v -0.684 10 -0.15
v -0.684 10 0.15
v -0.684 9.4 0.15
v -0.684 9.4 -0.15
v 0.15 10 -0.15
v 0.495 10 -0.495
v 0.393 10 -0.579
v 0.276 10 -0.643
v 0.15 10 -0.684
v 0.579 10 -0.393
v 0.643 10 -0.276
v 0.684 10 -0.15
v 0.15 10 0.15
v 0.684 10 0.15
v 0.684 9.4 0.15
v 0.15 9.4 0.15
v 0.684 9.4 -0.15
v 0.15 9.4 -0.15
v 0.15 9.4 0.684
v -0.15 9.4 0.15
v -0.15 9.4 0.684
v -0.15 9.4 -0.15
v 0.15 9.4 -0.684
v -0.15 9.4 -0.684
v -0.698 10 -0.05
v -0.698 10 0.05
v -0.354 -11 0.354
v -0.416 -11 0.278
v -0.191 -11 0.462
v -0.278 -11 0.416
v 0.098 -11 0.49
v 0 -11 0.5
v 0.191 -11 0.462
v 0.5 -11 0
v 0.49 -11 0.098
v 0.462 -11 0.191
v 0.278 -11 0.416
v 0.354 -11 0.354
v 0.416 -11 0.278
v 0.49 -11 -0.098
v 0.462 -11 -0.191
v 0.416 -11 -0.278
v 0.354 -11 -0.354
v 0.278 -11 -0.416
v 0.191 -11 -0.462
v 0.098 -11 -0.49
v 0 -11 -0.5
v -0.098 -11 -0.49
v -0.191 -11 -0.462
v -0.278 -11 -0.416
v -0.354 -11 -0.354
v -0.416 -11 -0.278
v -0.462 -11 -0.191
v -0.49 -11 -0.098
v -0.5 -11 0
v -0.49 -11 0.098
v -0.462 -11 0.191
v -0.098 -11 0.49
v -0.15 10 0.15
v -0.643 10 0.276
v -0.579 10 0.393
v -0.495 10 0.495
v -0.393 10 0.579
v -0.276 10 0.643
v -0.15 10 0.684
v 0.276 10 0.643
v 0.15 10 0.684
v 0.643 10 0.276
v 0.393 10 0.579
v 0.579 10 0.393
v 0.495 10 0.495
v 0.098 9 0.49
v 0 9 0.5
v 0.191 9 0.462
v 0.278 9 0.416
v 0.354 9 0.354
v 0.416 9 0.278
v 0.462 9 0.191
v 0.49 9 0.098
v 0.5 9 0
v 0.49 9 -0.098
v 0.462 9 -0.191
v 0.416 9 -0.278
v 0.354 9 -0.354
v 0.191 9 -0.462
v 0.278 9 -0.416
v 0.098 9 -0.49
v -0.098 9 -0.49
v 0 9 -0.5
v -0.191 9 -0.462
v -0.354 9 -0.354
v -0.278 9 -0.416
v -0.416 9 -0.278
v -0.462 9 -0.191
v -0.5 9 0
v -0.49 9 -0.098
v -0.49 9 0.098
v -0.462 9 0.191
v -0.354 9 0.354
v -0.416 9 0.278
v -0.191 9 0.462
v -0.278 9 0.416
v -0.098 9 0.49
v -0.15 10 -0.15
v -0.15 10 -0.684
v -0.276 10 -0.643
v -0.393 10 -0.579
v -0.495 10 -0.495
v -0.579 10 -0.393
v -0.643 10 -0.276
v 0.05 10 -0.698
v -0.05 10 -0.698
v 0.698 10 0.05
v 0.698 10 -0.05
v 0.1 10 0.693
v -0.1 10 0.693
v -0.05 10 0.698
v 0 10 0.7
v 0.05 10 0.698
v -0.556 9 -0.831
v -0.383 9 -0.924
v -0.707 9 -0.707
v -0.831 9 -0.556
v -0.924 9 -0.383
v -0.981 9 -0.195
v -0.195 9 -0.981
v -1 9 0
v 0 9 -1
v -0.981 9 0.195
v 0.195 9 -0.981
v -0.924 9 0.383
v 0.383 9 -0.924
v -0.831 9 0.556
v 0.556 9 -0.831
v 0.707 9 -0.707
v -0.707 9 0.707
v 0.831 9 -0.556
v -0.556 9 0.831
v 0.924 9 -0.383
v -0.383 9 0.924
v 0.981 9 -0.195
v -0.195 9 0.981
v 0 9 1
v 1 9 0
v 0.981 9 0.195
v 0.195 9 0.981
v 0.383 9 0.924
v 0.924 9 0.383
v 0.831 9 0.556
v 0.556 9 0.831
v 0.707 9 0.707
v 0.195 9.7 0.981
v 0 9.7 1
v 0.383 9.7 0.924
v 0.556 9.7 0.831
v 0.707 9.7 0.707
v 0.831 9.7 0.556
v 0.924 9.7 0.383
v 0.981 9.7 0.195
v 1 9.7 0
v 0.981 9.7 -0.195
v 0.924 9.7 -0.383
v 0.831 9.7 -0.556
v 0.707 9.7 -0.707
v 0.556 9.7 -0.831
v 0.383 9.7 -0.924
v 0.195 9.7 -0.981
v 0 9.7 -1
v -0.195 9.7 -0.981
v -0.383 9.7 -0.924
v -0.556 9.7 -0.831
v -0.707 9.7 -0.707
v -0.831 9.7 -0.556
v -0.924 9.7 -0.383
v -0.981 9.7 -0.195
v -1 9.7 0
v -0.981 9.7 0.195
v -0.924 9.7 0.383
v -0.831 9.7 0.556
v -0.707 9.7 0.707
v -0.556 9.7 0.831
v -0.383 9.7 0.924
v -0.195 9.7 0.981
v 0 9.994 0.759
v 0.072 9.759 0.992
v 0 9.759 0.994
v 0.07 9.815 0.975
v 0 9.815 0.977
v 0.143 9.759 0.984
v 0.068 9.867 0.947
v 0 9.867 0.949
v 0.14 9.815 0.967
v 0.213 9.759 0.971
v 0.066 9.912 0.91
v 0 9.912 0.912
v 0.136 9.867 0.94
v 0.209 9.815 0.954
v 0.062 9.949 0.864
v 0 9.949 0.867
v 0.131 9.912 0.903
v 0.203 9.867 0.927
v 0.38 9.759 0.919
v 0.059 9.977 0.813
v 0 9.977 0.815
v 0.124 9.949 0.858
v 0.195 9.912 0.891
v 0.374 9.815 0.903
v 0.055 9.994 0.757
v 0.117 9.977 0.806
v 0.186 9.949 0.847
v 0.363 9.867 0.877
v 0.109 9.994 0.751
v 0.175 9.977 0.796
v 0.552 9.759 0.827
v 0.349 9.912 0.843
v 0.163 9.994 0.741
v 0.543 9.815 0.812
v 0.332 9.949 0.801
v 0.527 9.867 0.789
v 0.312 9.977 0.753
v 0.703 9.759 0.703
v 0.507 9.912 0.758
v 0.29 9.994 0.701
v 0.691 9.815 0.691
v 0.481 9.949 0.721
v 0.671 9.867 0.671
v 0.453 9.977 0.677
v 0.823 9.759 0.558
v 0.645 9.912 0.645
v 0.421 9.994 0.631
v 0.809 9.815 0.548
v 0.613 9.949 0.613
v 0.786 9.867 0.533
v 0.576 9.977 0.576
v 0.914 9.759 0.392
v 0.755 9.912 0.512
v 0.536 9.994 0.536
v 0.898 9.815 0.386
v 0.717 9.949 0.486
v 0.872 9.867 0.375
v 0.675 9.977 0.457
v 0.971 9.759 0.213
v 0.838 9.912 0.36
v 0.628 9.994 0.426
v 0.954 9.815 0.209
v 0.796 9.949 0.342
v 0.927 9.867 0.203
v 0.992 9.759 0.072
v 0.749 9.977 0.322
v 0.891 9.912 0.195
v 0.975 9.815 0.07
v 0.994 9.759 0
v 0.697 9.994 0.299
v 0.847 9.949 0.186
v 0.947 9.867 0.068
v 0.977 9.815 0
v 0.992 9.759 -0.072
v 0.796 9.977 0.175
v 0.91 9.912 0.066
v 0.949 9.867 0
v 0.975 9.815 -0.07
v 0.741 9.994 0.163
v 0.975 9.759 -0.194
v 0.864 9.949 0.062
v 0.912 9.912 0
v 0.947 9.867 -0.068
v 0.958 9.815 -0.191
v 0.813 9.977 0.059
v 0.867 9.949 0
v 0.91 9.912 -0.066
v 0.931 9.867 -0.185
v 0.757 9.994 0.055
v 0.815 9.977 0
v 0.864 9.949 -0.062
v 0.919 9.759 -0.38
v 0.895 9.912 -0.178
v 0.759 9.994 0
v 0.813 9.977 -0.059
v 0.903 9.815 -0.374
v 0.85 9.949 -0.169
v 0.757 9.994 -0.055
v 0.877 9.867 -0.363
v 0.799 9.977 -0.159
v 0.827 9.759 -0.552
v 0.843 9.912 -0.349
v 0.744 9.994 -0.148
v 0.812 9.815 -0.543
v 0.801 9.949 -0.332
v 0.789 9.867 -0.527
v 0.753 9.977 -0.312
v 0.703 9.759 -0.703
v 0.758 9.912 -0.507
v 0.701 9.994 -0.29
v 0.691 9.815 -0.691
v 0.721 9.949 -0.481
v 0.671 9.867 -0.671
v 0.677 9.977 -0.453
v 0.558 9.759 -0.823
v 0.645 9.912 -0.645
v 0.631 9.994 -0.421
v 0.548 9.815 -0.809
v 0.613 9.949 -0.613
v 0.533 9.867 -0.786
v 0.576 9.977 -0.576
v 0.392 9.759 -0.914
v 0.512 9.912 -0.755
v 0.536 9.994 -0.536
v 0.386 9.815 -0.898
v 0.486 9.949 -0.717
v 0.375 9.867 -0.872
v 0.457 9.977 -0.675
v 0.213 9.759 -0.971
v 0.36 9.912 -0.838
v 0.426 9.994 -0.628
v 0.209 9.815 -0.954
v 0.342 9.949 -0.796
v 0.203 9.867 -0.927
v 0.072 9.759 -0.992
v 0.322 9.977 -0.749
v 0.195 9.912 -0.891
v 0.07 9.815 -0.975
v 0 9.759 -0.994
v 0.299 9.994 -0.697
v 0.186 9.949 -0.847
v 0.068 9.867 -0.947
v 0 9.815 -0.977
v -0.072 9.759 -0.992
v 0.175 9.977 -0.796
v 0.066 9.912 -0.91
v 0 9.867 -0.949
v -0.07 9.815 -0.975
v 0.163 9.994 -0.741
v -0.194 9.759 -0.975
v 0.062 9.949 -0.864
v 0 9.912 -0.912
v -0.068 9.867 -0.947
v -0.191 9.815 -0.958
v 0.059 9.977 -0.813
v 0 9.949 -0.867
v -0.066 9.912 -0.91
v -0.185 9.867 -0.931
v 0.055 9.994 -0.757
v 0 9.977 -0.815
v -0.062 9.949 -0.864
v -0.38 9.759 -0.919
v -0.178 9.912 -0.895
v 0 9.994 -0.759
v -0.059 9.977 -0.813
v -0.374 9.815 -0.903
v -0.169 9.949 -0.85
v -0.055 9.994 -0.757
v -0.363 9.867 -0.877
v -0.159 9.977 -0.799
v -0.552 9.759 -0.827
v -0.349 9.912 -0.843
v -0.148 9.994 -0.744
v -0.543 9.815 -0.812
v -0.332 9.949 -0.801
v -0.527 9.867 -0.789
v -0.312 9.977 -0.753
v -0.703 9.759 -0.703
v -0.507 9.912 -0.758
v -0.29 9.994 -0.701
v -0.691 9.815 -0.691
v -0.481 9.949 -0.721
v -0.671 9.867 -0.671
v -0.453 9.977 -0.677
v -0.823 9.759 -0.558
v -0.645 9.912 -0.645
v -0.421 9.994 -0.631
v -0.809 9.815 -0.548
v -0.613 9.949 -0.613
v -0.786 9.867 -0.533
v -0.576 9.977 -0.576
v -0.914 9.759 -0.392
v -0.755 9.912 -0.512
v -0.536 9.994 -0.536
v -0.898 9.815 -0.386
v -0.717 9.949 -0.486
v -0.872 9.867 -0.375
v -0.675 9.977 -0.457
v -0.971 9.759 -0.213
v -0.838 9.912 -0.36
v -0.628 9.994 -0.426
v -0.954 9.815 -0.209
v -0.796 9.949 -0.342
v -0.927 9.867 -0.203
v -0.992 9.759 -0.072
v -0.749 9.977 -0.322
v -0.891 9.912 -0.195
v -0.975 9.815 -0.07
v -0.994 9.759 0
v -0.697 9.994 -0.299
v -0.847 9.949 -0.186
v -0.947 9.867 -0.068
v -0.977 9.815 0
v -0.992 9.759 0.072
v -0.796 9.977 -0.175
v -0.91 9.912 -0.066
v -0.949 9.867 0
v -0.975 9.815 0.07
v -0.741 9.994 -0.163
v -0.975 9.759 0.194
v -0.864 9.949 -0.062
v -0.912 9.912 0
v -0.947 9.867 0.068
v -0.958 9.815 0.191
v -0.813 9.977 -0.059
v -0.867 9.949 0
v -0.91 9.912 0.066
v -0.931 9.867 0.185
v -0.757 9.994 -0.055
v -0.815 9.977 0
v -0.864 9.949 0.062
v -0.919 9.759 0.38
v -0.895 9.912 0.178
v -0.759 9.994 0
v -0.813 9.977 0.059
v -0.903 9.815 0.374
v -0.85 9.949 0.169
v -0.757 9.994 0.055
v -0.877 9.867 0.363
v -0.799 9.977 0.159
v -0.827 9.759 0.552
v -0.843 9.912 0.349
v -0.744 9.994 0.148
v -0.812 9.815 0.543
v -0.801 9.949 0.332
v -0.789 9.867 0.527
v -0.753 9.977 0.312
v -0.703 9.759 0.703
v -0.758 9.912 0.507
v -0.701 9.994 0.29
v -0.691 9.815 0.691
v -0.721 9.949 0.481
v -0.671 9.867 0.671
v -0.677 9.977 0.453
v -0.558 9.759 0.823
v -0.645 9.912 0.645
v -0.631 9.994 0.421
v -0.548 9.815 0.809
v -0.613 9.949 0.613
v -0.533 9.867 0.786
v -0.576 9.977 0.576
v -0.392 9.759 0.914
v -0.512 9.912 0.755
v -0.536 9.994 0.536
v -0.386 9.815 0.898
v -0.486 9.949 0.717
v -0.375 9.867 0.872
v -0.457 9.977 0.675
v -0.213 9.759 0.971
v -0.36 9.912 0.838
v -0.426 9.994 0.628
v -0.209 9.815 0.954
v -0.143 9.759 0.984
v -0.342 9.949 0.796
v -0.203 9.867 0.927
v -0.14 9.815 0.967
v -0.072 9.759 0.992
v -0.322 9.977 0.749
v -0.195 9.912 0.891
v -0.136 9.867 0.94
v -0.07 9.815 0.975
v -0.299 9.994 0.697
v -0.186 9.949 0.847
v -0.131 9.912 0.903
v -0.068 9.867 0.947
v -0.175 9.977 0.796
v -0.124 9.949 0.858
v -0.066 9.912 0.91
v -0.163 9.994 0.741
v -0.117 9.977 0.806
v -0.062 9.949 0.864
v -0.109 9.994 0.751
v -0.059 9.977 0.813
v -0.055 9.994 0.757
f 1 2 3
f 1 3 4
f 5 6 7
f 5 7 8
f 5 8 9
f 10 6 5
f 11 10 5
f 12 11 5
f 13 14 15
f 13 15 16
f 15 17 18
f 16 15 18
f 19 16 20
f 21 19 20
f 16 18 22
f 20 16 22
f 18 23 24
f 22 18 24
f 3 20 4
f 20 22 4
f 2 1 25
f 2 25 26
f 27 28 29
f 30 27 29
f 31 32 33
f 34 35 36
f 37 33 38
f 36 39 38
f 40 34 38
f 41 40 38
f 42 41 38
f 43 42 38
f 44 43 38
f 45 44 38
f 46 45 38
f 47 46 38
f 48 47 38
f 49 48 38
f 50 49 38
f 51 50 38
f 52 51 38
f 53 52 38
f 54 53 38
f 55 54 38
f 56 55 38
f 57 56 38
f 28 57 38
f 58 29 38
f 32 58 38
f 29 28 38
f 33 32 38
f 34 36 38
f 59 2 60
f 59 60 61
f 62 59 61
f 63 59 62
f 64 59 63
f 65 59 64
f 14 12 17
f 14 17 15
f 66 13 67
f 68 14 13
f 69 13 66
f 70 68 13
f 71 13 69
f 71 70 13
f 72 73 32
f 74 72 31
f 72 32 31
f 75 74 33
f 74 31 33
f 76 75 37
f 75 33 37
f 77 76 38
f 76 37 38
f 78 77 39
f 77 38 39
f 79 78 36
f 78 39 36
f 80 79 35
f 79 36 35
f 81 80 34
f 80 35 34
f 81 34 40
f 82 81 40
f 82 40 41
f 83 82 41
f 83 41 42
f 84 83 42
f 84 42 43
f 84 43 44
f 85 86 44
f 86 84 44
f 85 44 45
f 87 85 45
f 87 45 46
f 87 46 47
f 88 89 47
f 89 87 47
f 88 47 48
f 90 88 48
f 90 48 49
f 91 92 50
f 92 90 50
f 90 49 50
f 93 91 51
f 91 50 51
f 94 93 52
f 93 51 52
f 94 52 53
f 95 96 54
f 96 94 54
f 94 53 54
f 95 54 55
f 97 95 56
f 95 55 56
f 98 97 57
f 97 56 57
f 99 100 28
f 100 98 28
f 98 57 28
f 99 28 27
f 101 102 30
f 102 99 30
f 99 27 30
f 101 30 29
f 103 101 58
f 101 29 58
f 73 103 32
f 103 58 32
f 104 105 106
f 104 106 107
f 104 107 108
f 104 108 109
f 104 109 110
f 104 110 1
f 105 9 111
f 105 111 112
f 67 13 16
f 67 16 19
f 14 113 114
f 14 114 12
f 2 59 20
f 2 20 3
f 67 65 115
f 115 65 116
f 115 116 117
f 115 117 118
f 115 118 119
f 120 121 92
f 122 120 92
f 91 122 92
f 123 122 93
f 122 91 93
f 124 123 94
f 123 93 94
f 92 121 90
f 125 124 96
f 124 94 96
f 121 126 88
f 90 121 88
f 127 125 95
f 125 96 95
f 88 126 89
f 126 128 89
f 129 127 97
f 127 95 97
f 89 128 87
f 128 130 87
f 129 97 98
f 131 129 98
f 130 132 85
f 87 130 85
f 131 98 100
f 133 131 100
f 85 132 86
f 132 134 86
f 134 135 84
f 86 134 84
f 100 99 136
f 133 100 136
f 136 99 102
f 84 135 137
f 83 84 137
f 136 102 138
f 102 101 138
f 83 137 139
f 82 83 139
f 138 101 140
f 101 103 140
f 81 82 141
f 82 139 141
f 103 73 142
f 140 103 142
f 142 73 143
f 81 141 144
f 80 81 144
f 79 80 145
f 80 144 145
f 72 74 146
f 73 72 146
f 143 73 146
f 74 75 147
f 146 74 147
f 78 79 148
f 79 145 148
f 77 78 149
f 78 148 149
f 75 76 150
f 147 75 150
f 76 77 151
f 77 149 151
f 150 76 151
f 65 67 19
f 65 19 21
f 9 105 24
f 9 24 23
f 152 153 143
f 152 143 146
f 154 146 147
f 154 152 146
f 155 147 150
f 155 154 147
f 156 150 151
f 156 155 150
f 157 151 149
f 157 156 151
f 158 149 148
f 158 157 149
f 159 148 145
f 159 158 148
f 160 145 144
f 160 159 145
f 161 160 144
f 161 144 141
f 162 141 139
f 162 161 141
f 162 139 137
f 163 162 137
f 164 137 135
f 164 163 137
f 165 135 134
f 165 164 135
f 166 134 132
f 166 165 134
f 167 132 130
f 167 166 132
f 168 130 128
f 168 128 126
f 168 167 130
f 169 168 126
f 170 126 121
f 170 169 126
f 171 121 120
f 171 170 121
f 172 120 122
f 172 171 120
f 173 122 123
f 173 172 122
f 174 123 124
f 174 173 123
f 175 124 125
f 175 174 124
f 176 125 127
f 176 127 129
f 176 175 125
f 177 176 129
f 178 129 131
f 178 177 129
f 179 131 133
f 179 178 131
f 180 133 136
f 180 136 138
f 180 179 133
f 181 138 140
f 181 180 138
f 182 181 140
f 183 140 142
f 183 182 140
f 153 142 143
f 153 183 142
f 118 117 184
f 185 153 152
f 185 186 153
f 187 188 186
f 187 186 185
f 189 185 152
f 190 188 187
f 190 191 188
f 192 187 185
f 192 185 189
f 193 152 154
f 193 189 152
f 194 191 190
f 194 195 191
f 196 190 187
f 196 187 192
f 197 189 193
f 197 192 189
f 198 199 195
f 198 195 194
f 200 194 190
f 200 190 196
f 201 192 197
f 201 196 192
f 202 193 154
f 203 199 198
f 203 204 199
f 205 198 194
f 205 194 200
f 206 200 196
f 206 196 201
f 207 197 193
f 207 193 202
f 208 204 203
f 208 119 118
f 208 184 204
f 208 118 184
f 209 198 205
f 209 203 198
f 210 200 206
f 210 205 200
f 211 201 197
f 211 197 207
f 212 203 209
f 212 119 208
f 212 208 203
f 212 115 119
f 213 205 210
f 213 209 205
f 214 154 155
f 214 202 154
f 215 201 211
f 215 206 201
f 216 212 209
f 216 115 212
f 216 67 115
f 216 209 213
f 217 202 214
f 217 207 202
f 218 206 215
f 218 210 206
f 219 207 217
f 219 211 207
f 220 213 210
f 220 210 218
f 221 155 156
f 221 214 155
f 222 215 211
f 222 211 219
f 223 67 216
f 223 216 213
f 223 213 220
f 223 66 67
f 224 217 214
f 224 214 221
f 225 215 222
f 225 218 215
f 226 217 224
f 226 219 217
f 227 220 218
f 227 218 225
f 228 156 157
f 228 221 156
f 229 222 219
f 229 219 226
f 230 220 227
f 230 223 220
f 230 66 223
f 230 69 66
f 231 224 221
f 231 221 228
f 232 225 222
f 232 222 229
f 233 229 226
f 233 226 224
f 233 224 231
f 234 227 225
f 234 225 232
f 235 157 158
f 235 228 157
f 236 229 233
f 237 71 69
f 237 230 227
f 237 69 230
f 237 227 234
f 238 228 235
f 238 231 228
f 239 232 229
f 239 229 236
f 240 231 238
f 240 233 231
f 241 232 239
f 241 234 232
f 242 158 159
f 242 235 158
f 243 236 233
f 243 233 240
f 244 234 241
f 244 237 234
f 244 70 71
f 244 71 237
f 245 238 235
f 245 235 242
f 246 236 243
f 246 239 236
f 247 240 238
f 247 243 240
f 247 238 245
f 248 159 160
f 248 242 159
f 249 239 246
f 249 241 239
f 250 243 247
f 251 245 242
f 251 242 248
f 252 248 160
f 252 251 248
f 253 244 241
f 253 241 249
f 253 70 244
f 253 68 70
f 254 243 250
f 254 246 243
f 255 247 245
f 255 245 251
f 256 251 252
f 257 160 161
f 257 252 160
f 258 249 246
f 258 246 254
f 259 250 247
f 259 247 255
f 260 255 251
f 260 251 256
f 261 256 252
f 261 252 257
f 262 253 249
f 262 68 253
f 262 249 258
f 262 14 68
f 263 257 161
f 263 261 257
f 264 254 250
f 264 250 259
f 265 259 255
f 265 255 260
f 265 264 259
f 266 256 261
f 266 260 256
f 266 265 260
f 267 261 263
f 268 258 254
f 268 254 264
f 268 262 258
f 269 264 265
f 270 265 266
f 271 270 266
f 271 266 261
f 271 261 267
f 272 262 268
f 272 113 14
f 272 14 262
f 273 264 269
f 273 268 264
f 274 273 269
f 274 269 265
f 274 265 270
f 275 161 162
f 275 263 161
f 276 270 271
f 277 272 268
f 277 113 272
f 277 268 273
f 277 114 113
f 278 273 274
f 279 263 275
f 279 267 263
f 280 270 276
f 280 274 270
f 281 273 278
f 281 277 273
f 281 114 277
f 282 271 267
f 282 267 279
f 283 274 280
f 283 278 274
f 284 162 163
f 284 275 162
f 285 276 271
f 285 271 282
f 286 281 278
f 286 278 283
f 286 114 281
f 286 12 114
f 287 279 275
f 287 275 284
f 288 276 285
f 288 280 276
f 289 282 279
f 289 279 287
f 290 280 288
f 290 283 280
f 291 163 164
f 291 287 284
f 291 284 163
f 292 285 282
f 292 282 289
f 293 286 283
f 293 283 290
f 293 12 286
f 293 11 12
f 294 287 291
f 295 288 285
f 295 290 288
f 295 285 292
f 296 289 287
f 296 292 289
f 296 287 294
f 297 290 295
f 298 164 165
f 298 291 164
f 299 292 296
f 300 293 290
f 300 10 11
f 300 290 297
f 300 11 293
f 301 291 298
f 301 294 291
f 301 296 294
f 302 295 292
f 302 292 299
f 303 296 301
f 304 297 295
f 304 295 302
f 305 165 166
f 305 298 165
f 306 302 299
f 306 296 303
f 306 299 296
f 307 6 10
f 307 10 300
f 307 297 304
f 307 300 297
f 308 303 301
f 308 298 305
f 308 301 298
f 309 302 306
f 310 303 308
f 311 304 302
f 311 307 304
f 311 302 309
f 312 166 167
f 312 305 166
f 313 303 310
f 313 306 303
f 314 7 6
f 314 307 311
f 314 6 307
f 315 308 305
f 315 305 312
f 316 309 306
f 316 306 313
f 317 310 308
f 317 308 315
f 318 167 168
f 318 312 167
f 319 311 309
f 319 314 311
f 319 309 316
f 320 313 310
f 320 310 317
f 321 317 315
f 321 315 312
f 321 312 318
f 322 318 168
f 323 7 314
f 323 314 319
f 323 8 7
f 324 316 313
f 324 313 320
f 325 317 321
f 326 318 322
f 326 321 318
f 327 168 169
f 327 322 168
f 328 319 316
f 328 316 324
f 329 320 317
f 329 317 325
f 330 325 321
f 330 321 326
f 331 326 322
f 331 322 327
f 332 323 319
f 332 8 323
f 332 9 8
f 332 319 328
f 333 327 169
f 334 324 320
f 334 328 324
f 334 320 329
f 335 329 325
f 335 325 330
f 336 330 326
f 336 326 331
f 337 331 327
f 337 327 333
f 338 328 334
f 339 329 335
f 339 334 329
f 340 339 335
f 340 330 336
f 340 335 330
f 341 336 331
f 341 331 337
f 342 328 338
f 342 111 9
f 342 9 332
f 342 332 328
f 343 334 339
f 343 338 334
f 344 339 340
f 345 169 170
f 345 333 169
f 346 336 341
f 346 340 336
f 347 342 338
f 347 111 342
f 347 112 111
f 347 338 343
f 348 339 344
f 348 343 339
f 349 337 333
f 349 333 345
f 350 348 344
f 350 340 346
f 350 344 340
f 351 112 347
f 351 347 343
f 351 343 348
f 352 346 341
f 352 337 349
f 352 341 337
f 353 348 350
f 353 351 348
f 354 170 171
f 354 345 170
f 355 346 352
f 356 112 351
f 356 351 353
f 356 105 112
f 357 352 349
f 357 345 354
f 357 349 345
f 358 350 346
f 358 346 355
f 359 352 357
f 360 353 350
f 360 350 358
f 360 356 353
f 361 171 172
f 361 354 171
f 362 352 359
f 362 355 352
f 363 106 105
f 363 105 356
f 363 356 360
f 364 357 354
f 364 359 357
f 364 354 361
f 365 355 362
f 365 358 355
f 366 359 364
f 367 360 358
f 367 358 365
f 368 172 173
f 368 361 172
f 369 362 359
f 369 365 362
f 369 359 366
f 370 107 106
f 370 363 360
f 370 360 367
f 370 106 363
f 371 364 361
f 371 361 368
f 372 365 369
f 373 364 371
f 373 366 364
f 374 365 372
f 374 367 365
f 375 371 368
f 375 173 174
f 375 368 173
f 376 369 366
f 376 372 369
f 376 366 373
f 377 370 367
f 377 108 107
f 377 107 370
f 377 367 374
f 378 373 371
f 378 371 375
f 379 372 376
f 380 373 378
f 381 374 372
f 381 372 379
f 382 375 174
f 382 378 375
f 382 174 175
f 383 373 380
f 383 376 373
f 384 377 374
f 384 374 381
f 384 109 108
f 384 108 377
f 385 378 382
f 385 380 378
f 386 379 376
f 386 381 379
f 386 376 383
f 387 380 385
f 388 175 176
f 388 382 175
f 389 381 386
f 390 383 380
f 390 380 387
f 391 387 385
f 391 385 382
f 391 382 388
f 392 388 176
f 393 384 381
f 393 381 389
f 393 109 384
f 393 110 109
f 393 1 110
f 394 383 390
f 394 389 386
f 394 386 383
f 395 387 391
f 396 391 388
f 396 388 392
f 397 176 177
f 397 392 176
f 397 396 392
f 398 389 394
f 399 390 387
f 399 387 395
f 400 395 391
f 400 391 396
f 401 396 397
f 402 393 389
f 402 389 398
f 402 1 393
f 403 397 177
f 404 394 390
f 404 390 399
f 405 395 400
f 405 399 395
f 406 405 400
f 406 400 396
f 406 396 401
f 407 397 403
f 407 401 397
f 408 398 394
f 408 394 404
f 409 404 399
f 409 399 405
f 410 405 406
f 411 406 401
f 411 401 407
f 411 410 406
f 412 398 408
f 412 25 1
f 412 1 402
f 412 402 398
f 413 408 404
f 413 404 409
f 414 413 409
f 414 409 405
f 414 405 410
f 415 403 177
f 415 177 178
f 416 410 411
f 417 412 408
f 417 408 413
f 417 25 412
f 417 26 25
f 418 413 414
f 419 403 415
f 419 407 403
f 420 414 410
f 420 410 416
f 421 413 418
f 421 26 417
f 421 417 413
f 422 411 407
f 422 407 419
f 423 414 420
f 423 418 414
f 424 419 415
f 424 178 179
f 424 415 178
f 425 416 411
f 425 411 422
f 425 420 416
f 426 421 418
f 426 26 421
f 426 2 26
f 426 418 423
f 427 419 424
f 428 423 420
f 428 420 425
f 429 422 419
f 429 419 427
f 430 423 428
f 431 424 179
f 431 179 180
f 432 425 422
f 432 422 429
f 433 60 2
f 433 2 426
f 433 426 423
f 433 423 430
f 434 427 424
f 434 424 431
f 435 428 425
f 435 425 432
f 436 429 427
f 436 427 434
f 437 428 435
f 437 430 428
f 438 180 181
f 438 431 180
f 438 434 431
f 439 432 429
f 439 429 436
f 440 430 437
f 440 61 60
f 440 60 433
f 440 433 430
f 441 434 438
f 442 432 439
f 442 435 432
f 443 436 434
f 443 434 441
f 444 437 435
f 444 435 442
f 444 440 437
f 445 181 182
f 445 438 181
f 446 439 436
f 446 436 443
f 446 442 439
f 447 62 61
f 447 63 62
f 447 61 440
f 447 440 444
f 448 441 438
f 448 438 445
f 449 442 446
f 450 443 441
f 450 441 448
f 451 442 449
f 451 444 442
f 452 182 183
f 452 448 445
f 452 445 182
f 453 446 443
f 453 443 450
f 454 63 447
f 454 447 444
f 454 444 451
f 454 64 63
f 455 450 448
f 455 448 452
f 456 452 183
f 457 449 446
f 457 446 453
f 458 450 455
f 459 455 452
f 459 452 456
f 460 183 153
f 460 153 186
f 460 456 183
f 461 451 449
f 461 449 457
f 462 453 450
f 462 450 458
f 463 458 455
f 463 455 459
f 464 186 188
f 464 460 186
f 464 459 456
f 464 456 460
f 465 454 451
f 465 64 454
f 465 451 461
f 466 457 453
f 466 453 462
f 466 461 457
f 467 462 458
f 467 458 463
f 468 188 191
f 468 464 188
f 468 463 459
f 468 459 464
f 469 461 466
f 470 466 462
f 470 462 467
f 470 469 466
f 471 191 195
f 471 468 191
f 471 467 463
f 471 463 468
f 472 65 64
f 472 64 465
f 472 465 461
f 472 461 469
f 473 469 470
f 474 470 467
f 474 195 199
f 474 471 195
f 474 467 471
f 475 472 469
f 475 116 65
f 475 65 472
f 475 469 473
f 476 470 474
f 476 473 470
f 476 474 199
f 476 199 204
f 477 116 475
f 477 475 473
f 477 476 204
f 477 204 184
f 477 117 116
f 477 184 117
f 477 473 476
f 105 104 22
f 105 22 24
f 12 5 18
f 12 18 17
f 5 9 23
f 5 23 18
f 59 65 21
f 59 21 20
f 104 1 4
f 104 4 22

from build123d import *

# Parameters (mm, degrees)
BOSS_EXTRUDE1_DEPTH      = 10
BOSS_EXTRUDE1_DEPTH_BACK = 11
SKETCH1_R                = 0.5
SKETCH2_R                = 1
BOSS_EXTRUDE2_DEPTH      = 1
FILLET1_R                = 0.3
CUT_EXTRUDE1_DEPTH       = 0.6


with BuildPart() as part:
    # Sketch1 → Boss-Extrude1 (new, two sides: drawn at the far end of the back side and taken through both)
    with BuildSketch(Plane(origin=(0, 0, 0), x_dir=(1, 0, 0), z_dir=(0, 1, 0)).offset(-BOSS_EXTRUDE1_DEPTH_BACK)):
        with Locations(Location((0, 0, 0), (0, 0, 270))):
            Circle(SKETCH1_R)
    extrude(amount=BOSS_EXTRUDE1_DEPTH + BOSS_EXTRUDE1_DEPTH_BACK)

    # Sketch2 → Boss-Extrude2 (add)
    with BuildSketch(Plane(origin=(0, 10, 0), x_dir=(1, 0, 0), z_dir=(0, 1, 0))):
        with Locations(Location((0, 0, 0), (0, 0, 270))):
            Circle(SKETCH2_R)
    extrude(amount=-BOSS_EXTRUDE2_DEPTH)

    # Fillet1
    fillet1_edges = [part.edges().sort_by_distance(p)[0] for p in [
        (0, 10, -1),
    ]]
    fillet(fillet1_edges, radius=FILLET1_R)

    # Sketch3 → Cut-Extrude1 (cut)
    with BuildSketch(Plane(origin=(0, 10, 0), x_dir=(1, 0, 0), z_dir=(0, 1, 0))):
        Polygon((-0.15, 0.15), (-0.15, 0.683739717), (0.15, 0.683739717), (0.15, 0.15), (0.683739717, 0.15), (0.683739717, -0.15), (0.15, -0.15), (0.15, -0.683739717), (-0.15, -0.683739717), (-0.15, -0.15), (-0.683739717, -0.15), (-0.683739717, 0.15), align=None)
    extrude(amount=-CUT_EXTRUDE1_DEPTH, mode=Mode.SUBTRACT)


solid = part.part
